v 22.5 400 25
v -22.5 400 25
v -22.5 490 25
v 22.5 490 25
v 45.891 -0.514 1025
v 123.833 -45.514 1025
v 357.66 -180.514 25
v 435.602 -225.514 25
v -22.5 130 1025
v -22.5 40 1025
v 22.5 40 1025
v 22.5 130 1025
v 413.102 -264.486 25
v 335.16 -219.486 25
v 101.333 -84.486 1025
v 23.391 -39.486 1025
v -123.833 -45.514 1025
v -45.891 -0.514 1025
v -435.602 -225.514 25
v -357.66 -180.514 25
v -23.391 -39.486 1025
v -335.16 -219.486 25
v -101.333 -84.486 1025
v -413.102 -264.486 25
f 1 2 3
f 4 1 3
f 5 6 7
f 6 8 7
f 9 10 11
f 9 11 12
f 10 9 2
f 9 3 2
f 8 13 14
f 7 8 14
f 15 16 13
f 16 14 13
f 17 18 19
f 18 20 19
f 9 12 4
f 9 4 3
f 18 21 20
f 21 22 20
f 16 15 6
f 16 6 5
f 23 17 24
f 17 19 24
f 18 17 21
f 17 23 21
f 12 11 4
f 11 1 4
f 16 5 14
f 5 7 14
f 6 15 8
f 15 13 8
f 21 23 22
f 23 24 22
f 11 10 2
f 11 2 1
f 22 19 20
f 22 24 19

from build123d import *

# Parameters (mm, degrees)
F3_W = 45
F3_H = 90
F1_W = 45
F1_H = 90


with BuildPart() as f4:
    # F3 (on offset) → F4 section 0
    with BuildSketch(Plane.XY.offset(1025)):
        with Locations((0, 85)):
            Rectangle(F3_W, F3_H)
    # F1 (on offset) → F4 section 1
    with BuildSketch(Plane.XY.offset(25)):
        with Locations((0, 445)):
            Rectangle(F1_W, F1_H)
    loft()


with BuildPart() as f5:
    # F3 (on offset) → F5 section 0
    with BuildSketch(Plane.XY.offset(1025)):
        Polygon((101.333302, -84.485572), (123.833302, -45.514428), (45.891016, -0.514428), (23.391016, -39.485572), align=None)
    # F1 (on offset) → F5 section 1
    with BuildSketch(Plane.XY.offset(25)):
        Polygon((335.160162, -219.485572), (413.102448, -264.485572), (435.602448, -225.514428), (357.660162, -180.514428), align=None)
    loft()


with BuildPart() as f6:
    # F3 (on offset) → F6 section 0
    with BuildSketch(Plane.XY.offset(1025)):
        Polygon((-123.833302, -45.514428), (-101.333302, -84.485572), (-23.391016, -39.485572), (-45.891016, -0.514428), align=None)
    # F1 (on offset) → F6 section 1
    with BuildSketch(Plane.XY.offset(25)):
        Polygon((-357.660162, -180.514428), (-435.602448, -225.514428), (-413.102448, -264.485572), (-335.160162, -219.485572), align=None)
    loft()


solid = Compound([f4.part, f5.part, f6.part])
